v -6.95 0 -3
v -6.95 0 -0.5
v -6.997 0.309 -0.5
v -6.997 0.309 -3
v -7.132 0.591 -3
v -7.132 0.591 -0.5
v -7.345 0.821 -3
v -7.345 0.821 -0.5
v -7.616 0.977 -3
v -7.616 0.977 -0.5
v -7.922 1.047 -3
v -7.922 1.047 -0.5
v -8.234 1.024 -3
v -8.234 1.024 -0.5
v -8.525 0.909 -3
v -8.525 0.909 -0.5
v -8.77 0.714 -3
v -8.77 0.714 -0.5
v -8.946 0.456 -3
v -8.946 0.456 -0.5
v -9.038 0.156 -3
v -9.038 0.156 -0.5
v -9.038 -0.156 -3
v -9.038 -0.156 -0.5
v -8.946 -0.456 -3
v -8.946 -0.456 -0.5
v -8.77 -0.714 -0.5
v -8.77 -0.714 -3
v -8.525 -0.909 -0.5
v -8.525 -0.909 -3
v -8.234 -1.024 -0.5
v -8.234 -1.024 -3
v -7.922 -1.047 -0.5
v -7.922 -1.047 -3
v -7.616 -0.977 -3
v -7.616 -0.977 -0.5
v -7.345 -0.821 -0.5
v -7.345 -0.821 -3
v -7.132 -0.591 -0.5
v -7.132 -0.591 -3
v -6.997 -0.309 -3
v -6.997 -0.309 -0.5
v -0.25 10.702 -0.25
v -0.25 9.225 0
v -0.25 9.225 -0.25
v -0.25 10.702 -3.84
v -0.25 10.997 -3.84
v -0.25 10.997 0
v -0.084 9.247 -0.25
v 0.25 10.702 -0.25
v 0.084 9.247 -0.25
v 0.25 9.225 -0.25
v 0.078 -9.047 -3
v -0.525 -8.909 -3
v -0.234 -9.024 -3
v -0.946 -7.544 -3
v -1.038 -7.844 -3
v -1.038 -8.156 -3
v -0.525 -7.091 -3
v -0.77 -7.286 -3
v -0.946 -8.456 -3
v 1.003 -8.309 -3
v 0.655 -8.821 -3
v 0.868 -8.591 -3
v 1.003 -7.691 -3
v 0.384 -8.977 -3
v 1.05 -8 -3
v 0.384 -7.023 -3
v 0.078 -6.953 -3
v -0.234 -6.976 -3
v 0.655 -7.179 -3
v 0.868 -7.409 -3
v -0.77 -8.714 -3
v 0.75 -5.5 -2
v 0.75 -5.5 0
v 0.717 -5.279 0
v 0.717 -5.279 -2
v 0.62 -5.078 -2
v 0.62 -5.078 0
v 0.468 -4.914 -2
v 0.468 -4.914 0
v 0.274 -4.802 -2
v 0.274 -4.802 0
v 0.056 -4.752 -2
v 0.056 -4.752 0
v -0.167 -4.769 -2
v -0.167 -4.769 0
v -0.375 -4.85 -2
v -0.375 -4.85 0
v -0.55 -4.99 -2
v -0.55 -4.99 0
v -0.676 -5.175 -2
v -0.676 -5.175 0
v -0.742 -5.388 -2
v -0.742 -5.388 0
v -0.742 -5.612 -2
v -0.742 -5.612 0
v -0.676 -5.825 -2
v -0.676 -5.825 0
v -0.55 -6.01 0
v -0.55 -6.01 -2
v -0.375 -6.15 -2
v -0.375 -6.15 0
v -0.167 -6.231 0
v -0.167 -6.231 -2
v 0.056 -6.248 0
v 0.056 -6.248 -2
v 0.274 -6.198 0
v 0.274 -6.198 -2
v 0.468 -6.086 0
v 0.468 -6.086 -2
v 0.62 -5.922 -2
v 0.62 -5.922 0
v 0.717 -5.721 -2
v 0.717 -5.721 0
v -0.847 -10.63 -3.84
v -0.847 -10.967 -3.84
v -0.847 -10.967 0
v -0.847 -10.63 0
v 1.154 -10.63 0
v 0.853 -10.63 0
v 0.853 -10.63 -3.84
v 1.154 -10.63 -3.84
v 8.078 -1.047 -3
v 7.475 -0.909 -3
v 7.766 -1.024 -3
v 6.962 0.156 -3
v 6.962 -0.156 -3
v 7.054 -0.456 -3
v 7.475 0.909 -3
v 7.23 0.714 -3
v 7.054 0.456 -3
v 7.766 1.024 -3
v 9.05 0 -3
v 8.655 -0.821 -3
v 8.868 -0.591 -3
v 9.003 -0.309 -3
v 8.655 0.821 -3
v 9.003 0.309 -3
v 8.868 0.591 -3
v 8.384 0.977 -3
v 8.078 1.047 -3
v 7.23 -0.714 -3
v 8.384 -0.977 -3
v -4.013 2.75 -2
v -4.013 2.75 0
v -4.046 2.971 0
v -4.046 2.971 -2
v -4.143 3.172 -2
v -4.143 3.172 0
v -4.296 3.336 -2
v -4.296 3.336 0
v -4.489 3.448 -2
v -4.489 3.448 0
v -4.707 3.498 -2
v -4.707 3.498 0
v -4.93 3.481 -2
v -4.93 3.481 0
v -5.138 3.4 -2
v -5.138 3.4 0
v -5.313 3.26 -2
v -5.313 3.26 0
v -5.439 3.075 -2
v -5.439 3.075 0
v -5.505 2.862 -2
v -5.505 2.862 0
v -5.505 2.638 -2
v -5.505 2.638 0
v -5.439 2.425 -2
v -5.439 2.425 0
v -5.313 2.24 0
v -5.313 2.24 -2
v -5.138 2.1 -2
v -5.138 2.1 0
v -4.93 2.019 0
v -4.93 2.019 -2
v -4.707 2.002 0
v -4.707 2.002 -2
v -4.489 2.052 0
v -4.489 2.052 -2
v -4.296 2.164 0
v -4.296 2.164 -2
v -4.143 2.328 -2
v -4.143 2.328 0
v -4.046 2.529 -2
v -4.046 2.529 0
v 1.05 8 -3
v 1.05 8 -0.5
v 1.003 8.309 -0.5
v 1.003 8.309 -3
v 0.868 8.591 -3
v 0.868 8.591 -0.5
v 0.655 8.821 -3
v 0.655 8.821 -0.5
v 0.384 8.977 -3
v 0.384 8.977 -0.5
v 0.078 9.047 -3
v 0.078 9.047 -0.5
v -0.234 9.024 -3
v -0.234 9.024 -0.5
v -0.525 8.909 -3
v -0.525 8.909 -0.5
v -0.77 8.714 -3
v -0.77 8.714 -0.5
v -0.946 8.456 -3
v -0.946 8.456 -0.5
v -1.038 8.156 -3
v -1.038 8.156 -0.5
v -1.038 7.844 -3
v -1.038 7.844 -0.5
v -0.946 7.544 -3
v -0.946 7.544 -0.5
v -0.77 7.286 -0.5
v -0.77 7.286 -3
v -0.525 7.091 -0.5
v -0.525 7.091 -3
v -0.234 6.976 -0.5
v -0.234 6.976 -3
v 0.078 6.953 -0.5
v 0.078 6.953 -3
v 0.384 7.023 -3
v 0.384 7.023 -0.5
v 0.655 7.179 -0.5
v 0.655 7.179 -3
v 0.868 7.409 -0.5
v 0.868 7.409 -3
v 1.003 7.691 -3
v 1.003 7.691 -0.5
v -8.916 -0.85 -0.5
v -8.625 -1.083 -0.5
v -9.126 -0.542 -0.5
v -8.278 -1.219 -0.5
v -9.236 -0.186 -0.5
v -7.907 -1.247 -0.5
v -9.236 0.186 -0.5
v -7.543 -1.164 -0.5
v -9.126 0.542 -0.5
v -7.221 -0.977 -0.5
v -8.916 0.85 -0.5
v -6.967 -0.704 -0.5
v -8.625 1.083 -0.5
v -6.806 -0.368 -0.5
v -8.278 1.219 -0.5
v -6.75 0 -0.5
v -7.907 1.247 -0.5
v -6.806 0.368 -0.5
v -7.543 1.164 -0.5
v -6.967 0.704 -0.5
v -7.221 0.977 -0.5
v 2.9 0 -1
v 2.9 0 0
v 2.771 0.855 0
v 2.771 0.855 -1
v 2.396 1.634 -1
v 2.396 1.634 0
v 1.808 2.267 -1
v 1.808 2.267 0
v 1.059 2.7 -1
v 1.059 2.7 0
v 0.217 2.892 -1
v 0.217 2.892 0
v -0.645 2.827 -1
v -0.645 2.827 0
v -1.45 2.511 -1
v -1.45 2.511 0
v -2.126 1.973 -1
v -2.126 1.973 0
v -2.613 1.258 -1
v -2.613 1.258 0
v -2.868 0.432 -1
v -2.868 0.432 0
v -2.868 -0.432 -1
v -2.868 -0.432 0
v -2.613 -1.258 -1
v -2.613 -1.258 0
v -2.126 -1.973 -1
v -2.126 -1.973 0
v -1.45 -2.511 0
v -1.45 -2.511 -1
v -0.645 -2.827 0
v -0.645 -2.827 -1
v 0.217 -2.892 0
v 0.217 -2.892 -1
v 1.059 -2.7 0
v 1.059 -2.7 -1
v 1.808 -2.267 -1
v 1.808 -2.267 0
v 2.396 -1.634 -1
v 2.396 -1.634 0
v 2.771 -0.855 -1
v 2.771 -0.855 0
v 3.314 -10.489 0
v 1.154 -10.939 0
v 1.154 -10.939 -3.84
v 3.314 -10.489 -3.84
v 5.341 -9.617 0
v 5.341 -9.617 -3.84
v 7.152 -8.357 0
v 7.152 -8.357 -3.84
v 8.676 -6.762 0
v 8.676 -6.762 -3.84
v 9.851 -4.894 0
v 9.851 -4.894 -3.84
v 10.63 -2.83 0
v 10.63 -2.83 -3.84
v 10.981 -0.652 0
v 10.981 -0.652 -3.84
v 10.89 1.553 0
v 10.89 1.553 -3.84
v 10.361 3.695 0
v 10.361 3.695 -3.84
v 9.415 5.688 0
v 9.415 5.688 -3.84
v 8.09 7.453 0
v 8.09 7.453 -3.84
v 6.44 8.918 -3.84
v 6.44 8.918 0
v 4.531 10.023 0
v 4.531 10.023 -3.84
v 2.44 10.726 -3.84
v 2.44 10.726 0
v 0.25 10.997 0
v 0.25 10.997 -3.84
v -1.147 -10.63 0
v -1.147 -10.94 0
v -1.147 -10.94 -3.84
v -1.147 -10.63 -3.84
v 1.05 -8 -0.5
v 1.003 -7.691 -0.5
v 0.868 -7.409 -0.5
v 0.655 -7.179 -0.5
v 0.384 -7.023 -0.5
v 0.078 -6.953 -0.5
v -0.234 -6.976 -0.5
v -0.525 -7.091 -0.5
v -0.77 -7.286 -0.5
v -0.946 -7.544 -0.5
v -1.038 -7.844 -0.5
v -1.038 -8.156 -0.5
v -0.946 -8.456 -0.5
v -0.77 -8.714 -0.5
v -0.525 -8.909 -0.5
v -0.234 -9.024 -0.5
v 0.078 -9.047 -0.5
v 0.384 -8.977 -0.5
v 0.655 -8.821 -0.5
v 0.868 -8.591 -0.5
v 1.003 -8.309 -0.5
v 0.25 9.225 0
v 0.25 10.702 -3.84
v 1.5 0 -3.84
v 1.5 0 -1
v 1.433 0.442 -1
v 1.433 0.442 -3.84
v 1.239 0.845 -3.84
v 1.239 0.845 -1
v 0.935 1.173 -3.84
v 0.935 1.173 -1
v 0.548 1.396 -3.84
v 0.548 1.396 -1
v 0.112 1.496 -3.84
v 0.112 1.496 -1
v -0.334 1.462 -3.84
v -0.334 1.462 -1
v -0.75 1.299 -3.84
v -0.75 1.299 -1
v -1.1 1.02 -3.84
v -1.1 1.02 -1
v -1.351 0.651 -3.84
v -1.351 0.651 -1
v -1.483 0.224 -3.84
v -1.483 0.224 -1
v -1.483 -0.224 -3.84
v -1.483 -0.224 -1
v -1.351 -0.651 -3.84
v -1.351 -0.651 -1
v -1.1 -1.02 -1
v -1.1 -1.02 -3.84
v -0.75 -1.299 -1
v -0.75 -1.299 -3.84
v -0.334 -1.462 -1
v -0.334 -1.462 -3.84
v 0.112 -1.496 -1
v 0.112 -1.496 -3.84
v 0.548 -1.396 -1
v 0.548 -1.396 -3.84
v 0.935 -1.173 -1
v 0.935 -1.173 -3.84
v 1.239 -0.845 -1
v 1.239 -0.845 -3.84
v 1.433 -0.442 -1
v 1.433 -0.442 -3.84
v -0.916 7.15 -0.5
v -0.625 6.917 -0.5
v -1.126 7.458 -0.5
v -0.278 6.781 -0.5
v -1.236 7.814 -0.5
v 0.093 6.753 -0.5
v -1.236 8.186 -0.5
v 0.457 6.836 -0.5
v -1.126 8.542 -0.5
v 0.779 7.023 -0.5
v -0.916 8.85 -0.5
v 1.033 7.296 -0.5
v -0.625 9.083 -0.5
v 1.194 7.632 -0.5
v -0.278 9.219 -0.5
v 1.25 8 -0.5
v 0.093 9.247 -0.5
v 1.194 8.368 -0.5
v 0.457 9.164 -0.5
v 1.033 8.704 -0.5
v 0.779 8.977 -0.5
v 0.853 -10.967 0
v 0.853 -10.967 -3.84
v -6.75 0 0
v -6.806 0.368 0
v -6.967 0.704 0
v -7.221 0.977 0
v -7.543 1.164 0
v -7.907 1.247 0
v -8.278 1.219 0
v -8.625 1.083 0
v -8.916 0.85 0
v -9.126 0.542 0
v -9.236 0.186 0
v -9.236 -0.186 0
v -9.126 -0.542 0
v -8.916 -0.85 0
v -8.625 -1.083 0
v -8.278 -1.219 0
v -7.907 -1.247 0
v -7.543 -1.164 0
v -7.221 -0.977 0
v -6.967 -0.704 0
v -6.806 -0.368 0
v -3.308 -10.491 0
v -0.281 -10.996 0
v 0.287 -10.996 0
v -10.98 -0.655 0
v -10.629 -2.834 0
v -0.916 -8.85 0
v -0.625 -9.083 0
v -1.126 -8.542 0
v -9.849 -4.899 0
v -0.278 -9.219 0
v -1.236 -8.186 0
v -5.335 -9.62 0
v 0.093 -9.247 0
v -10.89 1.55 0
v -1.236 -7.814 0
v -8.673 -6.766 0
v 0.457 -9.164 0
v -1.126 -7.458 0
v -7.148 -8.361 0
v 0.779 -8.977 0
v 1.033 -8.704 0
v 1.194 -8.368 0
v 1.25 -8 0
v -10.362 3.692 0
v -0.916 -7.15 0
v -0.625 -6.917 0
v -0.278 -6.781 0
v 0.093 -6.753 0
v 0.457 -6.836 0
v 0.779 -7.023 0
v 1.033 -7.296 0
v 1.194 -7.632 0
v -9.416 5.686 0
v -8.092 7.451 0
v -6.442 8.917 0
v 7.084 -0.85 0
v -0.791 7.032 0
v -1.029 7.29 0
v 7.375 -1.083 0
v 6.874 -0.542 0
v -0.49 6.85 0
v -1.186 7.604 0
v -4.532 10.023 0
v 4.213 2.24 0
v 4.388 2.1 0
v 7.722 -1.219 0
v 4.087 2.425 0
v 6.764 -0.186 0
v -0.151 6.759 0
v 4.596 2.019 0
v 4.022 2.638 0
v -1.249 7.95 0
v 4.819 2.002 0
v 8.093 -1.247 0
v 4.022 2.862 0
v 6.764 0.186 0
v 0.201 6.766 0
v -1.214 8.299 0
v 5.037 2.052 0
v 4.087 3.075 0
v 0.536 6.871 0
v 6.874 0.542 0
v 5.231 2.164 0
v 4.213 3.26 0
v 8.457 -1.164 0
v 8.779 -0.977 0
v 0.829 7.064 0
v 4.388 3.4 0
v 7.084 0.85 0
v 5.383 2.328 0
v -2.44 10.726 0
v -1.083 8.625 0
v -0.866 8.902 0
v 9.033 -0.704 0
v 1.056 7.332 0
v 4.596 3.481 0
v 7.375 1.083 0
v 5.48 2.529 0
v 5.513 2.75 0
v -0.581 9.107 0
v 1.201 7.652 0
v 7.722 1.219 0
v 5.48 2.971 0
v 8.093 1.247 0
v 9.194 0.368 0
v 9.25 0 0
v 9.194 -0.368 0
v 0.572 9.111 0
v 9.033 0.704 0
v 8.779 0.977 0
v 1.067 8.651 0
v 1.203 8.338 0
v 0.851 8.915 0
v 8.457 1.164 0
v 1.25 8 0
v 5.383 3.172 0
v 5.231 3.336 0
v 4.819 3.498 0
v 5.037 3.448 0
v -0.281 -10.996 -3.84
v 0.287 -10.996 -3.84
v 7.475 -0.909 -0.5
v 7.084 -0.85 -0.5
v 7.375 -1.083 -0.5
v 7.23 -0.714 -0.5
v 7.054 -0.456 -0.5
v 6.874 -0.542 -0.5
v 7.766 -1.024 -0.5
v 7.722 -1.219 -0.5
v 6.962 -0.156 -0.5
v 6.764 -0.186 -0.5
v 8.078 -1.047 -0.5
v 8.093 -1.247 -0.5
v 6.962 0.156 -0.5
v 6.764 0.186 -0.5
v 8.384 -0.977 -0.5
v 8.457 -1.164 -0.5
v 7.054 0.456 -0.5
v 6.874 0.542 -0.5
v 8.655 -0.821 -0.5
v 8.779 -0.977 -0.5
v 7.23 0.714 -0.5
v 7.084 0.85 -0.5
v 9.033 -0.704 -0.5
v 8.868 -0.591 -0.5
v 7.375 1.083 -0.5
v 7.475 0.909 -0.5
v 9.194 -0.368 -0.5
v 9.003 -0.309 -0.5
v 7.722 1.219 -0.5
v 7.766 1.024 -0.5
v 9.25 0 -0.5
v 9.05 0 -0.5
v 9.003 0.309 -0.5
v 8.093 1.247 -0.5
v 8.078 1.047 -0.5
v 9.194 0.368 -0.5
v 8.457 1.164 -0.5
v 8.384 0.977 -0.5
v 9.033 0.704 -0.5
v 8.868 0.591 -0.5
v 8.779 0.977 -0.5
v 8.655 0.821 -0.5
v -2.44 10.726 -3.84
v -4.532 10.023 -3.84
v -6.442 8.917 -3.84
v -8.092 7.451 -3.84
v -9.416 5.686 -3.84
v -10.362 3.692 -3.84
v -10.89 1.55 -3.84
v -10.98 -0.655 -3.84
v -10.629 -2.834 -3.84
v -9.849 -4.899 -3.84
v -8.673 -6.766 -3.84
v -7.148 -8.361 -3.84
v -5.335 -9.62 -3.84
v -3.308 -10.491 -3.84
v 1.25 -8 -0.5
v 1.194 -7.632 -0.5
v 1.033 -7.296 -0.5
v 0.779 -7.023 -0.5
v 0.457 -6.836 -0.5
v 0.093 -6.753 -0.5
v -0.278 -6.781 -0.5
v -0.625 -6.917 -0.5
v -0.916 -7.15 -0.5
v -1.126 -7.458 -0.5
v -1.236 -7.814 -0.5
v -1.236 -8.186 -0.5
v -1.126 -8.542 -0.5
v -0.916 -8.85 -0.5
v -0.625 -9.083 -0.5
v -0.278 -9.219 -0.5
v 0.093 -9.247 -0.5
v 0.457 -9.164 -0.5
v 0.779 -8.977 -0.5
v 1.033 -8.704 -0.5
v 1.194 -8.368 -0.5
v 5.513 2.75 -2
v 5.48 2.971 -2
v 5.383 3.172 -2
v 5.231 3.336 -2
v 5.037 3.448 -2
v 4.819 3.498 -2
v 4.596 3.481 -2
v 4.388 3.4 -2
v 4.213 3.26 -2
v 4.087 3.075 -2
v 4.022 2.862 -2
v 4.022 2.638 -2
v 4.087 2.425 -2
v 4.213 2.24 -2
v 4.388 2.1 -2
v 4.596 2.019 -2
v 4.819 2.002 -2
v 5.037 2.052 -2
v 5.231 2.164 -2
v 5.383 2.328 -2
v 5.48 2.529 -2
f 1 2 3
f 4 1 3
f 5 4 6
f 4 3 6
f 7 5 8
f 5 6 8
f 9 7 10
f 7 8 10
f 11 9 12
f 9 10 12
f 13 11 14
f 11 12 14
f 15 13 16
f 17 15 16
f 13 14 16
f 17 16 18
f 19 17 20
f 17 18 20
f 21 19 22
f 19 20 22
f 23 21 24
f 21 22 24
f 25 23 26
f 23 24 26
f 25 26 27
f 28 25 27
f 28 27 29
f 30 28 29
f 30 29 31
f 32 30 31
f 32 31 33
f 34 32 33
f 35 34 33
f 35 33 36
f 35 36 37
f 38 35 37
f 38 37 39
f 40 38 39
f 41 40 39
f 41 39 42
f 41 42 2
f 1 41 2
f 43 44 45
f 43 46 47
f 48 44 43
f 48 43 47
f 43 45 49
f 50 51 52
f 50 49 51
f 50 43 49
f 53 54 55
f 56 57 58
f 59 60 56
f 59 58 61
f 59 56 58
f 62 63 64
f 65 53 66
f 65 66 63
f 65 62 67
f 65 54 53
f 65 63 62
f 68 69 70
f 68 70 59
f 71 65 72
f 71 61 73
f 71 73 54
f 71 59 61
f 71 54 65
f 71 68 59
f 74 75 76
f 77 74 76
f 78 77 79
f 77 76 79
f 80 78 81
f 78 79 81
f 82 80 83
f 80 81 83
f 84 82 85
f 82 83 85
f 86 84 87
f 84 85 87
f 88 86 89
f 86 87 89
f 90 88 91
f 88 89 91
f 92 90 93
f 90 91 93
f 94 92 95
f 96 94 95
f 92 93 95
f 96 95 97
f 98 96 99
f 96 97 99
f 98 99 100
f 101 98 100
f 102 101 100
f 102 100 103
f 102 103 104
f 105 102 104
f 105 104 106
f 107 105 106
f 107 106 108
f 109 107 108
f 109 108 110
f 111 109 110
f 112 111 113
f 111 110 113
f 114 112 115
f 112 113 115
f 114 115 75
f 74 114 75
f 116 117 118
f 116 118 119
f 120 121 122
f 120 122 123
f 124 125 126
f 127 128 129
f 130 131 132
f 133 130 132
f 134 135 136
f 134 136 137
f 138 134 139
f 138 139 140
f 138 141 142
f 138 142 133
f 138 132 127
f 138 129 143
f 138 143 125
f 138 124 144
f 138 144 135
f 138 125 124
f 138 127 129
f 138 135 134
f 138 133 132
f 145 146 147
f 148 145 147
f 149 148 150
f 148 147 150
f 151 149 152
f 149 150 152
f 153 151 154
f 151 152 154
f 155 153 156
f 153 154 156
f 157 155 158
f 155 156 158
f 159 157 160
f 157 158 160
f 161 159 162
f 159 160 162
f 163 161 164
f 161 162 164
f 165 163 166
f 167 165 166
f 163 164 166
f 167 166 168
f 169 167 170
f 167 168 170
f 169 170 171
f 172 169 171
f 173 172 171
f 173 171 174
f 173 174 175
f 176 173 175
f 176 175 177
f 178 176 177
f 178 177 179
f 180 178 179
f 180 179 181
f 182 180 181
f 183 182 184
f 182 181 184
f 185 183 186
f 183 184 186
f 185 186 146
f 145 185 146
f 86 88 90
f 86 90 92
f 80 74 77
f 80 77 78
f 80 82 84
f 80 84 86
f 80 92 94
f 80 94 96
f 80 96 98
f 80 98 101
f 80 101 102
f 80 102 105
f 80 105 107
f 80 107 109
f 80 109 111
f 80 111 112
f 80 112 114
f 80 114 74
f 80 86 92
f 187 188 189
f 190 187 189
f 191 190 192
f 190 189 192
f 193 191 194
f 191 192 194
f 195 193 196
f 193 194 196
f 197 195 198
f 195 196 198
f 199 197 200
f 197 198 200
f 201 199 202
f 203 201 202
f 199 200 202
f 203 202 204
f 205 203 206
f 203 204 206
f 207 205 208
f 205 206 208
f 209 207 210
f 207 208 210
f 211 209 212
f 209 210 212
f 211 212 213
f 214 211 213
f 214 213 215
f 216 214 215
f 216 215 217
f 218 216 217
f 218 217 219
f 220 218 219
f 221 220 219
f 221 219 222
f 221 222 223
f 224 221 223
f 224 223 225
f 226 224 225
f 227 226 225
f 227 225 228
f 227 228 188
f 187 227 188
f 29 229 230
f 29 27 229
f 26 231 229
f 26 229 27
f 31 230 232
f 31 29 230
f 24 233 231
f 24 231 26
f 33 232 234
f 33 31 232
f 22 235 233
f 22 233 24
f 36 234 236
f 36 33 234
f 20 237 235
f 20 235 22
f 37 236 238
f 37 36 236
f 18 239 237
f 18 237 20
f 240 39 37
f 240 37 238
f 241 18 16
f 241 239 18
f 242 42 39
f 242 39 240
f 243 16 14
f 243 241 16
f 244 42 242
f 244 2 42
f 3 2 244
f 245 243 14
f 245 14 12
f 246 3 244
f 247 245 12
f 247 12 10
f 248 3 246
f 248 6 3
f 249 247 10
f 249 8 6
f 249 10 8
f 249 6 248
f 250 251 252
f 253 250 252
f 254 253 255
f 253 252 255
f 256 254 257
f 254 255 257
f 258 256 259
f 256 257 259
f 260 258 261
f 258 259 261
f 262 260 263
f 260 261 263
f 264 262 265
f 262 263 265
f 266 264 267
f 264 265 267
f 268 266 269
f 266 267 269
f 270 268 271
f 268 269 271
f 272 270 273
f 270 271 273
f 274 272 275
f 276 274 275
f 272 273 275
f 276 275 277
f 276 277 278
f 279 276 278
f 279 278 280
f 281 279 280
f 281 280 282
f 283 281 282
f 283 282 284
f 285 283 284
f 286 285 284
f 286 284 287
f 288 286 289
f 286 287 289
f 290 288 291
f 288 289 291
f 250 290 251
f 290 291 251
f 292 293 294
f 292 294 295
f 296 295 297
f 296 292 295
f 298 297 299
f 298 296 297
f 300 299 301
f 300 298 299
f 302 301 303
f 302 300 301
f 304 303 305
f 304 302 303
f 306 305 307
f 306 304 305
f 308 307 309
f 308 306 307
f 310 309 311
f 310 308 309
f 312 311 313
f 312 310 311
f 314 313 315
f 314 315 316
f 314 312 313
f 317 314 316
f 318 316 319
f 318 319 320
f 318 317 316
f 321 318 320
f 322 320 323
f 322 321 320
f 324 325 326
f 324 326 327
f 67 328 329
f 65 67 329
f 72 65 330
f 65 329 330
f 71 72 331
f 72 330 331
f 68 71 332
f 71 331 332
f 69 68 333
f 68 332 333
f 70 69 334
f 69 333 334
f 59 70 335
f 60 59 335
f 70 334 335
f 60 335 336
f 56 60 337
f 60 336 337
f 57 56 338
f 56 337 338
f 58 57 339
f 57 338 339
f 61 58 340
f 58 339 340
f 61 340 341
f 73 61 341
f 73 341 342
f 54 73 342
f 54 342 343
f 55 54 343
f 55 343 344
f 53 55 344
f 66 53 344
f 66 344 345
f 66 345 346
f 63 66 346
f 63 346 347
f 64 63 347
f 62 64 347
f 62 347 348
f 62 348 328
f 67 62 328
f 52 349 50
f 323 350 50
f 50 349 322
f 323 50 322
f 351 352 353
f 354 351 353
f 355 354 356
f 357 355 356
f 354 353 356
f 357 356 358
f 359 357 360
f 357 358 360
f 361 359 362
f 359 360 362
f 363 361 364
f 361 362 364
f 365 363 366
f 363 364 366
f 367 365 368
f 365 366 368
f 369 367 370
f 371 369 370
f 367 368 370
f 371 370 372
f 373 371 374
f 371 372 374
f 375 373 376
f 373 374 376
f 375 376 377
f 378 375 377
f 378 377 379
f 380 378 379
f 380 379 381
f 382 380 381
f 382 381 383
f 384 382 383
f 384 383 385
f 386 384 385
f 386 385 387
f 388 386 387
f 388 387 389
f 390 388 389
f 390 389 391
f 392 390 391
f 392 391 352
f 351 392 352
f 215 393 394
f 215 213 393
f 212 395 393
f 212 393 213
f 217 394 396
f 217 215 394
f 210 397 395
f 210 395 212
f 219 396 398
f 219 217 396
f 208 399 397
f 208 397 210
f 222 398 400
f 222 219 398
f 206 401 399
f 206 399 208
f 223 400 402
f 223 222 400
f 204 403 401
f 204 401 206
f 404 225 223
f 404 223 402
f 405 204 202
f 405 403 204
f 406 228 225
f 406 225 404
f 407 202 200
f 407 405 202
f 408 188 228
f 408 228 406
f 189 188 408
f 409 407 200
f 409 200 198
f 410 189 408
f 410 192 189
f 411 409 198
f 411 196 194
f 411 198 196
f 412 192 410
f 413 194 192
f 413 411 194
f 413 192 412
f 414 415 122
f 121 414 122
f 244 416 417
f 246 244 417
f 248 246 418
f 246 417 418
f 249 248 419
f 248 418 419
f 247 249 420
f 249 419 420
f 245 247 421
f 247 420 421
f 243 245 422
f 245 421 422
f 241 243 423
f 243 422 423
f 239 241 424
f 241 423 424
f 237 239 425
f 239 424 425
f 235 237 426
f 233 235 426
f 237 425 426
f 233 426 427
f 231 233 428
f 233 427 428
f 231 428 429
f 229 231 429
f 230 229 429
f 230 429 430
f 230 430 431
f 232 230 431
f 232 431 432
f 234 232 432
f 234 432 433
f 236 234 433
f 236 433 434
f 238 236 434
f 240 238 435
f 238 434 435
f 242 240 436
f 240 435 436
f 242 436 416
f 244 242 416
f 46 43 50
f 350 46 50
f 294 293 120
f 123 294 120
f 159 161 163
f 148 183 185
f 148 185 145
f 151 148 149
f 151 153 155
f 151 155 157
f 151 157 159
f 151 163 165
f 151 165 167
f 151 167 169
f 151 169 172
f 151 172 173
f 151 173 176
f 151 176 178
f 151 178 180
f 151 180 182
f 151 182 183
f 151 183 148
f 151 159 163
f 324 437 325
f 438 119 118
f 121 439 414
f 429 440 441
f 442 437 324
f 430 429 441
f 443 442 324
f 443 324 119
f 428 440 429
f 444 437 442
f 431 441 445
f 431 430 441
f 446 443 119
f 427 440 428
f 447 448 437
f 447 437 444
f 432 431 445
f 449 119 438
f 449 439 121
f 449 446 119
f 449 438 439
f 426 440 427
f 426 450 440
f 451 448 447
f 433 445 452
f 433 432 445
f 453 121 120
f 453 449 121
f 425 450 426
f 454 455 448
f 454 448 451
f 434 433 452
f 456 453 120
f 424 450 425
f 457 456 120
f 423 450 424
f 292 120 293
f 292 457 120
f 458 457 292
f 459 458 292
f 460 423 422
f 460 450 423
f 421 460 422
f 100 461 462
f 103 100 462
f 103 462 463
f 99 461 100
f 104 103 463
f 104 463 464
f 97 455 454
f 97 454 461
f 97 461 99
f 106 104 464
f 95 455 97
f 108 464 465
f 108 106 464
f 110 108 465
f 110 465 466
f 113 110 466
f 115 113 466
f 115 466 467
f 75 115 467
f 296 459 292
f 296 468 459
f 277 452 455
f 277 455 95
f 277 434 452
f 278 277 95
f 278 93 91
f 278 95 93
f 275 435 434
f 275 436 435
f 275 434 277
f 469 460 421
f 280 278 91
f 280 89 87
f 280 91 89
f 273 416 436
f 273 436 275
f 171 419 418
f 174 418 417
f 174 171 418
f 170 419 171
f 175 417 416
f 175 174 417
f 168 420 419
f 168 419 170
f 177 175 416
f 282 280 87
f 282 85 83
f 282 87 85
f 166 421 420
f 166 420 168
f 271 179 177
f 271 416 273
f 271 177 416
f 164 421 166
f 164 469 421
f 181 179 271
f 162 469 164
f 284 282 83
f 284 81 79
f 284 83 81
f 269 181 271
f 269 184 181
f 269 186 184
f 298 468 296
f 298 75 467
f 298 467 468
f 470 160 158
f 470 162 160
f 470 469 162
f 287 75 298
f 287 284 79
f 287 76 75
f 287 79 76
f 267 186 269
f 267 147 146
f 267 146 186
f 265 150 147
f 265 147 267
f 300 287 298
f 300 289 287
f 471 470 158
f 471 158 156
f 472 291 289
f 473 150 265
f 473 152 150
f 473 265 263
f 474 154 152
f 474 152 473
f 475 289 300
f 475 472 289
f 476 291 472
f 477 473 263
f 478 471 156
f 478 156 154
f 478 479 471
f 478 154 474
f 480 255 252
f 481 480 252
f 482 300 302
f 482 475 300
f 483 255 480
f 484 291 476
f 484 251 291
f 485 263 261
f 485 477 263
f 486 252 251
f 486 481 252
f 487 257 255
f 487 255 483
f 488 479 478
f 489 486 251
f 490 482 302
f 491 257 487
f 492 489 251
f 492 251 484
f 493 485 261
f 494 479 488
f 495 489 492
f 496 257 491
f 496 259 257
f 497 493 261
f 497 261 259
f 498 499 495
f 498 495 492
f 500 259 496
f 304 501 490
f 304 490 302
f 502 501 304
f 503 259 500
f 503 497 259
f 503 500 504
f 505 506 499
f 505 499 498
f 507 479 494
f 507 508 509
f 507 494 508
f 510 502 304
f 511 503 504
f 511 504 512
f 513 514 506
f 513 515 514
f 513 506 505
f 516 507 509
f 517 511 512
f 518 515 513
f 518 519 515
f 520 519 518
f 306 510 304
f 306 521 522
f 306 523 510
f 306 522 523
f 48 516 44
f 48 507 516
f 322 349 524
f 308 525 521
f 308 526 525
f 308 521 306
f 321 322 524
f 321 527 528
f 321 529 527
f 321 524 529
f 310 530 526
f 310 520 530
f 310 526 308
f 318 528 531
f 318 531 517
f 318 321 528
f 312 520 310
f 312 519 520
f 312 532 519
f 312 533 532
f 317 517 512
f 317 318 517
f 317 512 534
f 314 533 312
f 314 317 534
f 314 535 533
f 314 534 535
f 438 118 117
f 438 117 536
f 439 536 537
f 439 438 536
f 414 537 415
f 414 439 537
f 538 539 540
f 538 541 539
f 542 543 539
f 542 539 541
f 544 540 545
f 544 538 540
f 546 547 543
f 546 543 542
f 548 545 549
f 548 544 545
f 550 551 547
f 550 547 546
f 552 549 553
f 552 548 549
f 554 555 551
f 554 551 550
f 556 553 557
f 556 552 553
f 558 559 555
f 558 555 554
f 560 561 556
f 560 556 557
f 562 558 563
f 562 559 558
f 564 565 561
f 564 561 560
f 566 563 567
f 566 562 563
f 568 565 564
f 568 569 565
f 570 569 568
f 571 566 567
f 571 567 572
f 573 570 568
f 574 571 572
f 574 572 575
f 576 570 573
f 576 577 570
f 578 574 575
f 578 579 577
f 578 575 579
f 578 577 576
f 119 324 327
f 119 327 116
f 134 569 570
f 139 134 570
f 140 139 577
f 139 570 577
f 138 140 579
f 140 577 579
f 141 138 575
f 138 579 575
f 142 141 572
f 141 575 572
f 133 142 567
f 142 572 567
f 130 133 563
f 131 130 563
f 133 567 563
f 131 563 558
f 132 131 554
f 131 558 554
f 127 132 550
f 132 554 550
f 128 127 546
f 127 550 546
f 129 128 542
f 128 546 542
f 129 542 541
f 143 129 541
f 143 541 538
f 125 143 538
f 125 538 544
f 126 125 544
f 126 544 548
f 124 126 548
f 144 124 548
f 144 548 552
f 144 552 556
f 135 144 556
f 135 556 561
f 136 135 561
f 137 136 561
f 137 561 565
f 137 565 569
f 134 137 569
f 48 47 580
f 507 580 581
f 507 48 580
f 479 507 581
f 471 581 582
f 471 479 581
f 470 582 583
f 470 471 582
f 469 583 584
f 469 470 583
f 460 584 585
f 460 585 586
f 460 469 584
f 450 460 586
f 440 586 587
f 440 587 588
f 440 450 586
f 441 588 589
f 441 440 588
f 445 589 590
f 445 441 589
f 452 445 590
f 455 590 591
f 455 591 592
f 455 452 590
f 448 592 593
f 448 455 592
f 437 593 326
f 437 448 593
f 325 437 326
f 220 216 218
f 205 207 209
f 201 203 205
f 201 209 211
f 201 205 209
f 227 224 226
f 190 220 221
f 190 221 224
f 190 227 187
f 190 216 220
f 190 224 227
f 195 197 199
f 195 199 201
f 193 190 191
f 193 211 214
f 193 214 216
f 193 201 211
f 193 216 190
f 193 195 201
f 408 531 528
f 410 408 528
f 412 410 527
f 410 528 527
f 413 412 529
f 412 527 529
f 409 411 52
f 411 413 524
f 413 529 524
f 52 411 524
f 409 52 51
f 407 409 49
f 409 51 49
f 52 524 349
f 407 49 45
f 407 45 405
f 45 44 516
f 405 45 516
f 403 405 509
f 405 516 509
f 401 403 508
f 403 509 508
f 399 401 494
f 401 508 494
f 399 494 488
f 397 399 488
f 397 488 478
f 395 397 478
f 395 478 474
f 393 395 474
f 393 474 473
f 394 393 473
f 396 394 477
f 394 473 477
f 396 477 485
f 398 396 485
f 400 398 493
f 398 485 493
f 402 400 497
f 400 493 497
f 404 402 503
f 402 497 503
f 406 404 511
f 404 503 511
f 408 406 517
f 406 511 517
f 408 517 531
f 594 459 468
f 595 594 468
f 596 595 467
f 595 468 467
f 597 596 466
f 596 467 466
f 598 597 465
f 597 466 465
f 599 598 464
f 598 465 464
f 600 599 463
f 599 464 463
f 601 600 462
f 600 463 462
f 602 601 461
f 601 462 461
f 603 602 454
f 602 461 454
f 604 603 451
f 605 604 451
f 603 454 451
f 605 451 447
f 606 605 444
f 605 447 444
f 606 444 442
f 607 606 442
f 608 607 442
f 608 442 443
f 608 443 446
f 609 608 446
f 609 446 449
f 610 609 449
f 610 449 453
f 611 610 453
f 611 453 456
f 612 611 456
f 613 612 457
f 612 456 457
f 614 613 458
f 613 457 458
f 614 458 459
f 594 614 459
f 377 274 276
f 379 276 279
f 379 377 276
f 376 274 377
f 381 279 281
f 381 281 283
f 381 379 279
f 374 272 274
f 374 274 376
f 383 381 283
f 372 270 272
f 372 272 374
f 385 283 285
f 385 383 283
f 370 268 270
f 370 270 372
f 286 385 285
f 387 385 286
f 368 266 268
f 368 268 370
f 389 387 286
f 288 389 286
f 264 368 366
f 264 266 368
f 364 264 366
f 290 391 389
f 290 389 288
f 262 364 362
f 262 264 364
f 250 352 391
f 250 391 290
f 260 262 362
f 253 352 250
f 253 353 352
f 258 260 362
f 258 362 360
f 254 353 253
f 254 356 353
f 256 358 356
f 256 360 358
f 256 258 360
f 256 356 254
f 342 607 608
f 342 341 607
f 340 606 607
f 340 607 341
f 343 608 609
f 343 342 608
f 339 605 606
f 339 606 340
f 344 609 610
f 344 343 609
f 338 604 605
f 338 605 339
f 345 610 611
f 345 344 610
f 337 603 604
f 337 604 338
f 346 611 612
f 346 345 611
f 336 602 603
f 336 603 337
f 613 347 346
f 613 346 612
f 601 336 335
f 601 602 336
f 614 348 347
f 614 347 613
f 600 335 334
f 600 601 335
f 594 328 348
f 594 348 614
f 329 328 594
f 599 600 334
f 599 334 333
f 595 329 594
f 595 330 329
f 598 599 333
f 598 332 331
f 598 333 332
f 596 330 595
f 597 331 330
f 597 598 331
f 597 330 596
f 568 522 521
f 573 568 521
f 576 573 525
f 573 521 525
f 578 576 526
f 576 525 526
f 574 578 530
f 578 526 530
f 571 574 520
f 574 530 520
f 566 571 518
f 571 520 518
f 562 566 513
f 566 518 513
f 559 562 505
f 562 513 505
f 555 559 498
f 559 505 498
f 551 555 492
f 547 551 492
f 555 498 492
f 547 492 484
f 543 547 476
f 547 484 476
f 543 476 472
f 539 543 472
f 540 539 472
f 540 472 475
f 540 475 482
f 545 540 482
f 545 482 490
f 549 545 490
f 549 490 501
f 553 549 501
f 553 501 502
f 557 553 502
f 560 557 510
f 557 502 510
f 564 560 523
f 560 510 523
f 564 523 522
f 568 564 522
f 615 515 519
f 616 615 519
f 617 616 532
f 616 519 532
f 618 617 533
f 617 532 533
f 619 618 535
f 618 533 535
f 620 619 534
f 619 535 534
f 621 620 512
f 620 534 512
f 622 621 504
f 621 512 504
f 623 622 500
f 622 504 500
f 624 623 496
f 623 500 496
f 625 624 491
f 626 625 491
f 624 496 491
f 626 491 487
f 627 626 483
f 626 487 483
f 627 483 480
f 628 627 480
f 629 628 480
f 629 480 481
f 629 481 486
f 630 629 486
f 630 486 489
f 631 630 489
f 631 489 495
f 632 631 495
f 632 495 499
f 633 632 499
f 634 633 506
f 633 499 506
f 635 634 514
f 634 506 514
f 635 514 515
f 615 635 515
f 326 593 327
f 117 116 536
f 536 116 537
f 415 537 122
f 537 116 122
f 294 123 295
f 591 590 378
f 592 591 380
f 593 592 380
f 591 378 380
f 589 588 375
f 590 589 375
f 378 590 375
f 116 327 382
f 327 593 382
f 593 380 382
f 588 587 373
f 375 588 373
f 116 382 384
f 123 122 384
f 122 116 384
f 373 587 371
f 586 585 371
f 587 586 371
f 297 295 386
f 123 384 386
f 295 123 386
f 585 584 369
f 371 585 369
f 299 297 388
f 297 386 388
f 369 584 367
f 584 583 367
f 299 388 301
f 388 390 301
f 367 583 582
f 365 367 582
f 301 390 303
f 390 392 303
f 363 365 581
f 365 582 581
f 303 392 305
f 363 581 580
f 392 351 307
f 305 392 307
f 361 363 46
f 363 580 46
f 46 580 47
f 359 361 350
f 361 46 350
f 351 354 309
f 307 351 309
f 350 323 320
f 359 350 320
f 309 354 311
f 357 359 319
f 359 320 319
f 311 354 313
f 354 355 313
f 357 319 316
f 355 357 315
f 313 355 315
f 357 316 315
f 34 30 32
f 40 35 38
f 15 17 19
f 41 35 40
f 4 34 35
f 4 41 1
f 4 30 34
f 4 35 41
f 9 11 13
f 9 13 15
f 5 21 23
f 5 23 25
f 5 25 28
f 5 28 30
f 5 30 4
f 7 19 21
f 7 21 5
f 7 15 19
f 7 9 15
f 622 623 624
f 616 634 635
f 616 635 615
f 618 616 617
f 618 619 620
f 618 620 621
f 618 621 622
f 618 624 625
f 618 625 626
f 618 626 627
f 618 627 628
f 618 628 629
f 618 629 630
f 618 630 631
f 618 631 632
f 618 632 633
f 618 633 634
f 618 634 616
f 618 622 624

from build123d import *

# Parameters (mm, degrees)
SKETCH5_R           = 11
BOSS_EXTRUDE3_DEPTH = 3.84
SKETCH6_R           = 1.5
CUT_EXTRUDE16_DEPTH = 3.84
SKETCH6_8_R         = 2.9
SKETCH6_8_R_2       = 1.5
CUT_EXTRUDE17_DEPTH = 1
SKETCH7_R           = 0.75
CUT_EXTRUDE18_DEPTH = 2
SKETCH8_R           = 1.05
CUT_EXTRUDE20_DEPTH = 3
SKETCH8_4_R         = 1.25
SKETCH8_4_R_2       = 1.05
CUT_EXTRUDE21_DEPTH = 0.5
SKETCH15_W          = 0.299586516
SKETCH15_H          = 0.370347028
SKETCH15_W_2        = 0.300671414
CUT_EXTRUDE22_DEPTH = 3.84
SKETCH16_W          = 0.5
SKETCH16_H          = 0.298358963
CUT_EXTRUDE23_DEPTH = 3.84
SKETCH17_W          = 0.5
SKETCH17_H          = 1.60013733
CUT_EXTRUDE24_DEPTH = 0.25


with BuildPart() as part:
    # Sketch5 → Boss-Extrude3 (new body)
    with BuildSketch(Plane.XY):
        Circle(SKETCH5_R)
    extrude(amount=-BOSS_EXTRUDE3_DEPTH)

    # Sketch6 → Cut-Extrude16 (cut)
    with BuildSketch(Plane.XY):
        Circle(SKETCH6_R)
    extrude(amount=-CUT_EXTRUDE16_DEPTH, mode=Mode.SUBTRACT)

    # Sketch6<8> → Cut-Extrude17 (cut)
    with BuildSketch(Plane.XY):
        Circle(SKETCH6_8_R)
        Circle(SKETCH6_8_R_2, mode=Mode.SUBTRACT)
    extrude(amount=-CUT_EXTRUDE17_DEPTH, mode=Mode.SUBTRACT)

    # Sketch7 → Cut-Extrude18 (cut)
    with BuildSketch(Plane.XY):
        with Locations((-4.763139721, 2.75)):
            Circle(SKETCH7_R)
        with Locations((4.763139721, 2.75)):
            Circle(SKETCH7_R)
        with Locations((0, -5.5)):
            Circle(SKETCH7_R)
    extrude(amount=-CUT_EXTRUDE18_DEPTH, mode=Mode.SUBTRACT)

    # Sketch8 → Cut-Extrude20 (cut)
    with BuildSketch(Plane.XY):
        with Locations((-8, 0)):
            Circle(SKETCH8_R)
        with Locations((0, -8)):
            Circle(SKETCH8_R)
        with Locations((8, 0)):
            Circle(SKETCH8_R)
        with Locations((0, 8)):
            Circle(SKETCH8_R)
    extrude(amount=-CUT_EXTRUDE20_DEPTH, mode=Mode.SUBTRACT)

    # Sketch8<4> → Cut-Extrude21 (cut)
    # profile 1 of 4: a face of its own
    with BuildSketch(Plane.XY):
        with Locations((-8, 0)):
            Circle(SKETCH8_4_R)
        with Locations((-8, 0)):
            Circle(SKETCH8_4_R_2, mode=Mode.SUBTRACT)
    # profile 2 of 4: a face of its own
    with BuildSketch(Plane.XY):
        with Locations((0, -8)):
            Circle(SKETCH8_4_R)
        with Locations((0, -8)):
            Circle(SKETCH8_4_R_2, mode=Mode.SUBTRACT)
    # profile 3 of 4: a face of its own
    with BuildSketch(Plane.XY):
        with Locations((8, 0)):
            Circle(SKETCH8_4_R)
        with Locations((8, 0)):
            Circle(SKETCH8_4_R_2, mode=Mode.SUBTRACT)
    # profile 4 of 4: a face of its own
    with BuildSketch(Plane.XY):
        with Locations((0, 8)):
            Circle(SKETCH8_4_R)
        with Locations((0, 8)):
            Circle(SKETCH8_4_R_2, mode=Mode.SUBTRACT)
    extrude(amount=-CUT_EXTRUDE21_DEPTH, mode=Mode.SUBTRACT)

    # Sketch15 → Cut-Extrude22 (cut)
    with BuildSketch(Plane.XY):
        with Locations((-0.997080085, -10.814826486)):
            Rectangle(SKETCH15_W, SKETCH15_H)
        with Locations((1.003807665, -10.814826486)):
            Rectangle(SKETCH15_W_2, SKETCH15_H)
    extrude(amount=-CUT_EXTRUDE22_DEPTH, mode=Mode.SUBTRACT)

    # Sketch16 → Cut-Extrude23 (cut)
    with BuildSketch(Plane.XY):
        with Locations((0, 10.850819912)):
            Rectangle(SKETCH16_W, SKETCH16_H)
    extrude(amount=-CUT_EXTRUDE23_DEPTH, mode=Mode.SUBTRACT)

    # Sketch17 → Cut-Extrude24 (cut)
    with BuildSketch(Plane.XY):
        with Locations((0, 9.901571765)):
            Rectangle(SKETCH17_W, SKETCH17_H)
    extrude(amount=-CUT_EXTRUDE24_DEPTH, mode=Mode.SUBTRACT)


solid = part.part
